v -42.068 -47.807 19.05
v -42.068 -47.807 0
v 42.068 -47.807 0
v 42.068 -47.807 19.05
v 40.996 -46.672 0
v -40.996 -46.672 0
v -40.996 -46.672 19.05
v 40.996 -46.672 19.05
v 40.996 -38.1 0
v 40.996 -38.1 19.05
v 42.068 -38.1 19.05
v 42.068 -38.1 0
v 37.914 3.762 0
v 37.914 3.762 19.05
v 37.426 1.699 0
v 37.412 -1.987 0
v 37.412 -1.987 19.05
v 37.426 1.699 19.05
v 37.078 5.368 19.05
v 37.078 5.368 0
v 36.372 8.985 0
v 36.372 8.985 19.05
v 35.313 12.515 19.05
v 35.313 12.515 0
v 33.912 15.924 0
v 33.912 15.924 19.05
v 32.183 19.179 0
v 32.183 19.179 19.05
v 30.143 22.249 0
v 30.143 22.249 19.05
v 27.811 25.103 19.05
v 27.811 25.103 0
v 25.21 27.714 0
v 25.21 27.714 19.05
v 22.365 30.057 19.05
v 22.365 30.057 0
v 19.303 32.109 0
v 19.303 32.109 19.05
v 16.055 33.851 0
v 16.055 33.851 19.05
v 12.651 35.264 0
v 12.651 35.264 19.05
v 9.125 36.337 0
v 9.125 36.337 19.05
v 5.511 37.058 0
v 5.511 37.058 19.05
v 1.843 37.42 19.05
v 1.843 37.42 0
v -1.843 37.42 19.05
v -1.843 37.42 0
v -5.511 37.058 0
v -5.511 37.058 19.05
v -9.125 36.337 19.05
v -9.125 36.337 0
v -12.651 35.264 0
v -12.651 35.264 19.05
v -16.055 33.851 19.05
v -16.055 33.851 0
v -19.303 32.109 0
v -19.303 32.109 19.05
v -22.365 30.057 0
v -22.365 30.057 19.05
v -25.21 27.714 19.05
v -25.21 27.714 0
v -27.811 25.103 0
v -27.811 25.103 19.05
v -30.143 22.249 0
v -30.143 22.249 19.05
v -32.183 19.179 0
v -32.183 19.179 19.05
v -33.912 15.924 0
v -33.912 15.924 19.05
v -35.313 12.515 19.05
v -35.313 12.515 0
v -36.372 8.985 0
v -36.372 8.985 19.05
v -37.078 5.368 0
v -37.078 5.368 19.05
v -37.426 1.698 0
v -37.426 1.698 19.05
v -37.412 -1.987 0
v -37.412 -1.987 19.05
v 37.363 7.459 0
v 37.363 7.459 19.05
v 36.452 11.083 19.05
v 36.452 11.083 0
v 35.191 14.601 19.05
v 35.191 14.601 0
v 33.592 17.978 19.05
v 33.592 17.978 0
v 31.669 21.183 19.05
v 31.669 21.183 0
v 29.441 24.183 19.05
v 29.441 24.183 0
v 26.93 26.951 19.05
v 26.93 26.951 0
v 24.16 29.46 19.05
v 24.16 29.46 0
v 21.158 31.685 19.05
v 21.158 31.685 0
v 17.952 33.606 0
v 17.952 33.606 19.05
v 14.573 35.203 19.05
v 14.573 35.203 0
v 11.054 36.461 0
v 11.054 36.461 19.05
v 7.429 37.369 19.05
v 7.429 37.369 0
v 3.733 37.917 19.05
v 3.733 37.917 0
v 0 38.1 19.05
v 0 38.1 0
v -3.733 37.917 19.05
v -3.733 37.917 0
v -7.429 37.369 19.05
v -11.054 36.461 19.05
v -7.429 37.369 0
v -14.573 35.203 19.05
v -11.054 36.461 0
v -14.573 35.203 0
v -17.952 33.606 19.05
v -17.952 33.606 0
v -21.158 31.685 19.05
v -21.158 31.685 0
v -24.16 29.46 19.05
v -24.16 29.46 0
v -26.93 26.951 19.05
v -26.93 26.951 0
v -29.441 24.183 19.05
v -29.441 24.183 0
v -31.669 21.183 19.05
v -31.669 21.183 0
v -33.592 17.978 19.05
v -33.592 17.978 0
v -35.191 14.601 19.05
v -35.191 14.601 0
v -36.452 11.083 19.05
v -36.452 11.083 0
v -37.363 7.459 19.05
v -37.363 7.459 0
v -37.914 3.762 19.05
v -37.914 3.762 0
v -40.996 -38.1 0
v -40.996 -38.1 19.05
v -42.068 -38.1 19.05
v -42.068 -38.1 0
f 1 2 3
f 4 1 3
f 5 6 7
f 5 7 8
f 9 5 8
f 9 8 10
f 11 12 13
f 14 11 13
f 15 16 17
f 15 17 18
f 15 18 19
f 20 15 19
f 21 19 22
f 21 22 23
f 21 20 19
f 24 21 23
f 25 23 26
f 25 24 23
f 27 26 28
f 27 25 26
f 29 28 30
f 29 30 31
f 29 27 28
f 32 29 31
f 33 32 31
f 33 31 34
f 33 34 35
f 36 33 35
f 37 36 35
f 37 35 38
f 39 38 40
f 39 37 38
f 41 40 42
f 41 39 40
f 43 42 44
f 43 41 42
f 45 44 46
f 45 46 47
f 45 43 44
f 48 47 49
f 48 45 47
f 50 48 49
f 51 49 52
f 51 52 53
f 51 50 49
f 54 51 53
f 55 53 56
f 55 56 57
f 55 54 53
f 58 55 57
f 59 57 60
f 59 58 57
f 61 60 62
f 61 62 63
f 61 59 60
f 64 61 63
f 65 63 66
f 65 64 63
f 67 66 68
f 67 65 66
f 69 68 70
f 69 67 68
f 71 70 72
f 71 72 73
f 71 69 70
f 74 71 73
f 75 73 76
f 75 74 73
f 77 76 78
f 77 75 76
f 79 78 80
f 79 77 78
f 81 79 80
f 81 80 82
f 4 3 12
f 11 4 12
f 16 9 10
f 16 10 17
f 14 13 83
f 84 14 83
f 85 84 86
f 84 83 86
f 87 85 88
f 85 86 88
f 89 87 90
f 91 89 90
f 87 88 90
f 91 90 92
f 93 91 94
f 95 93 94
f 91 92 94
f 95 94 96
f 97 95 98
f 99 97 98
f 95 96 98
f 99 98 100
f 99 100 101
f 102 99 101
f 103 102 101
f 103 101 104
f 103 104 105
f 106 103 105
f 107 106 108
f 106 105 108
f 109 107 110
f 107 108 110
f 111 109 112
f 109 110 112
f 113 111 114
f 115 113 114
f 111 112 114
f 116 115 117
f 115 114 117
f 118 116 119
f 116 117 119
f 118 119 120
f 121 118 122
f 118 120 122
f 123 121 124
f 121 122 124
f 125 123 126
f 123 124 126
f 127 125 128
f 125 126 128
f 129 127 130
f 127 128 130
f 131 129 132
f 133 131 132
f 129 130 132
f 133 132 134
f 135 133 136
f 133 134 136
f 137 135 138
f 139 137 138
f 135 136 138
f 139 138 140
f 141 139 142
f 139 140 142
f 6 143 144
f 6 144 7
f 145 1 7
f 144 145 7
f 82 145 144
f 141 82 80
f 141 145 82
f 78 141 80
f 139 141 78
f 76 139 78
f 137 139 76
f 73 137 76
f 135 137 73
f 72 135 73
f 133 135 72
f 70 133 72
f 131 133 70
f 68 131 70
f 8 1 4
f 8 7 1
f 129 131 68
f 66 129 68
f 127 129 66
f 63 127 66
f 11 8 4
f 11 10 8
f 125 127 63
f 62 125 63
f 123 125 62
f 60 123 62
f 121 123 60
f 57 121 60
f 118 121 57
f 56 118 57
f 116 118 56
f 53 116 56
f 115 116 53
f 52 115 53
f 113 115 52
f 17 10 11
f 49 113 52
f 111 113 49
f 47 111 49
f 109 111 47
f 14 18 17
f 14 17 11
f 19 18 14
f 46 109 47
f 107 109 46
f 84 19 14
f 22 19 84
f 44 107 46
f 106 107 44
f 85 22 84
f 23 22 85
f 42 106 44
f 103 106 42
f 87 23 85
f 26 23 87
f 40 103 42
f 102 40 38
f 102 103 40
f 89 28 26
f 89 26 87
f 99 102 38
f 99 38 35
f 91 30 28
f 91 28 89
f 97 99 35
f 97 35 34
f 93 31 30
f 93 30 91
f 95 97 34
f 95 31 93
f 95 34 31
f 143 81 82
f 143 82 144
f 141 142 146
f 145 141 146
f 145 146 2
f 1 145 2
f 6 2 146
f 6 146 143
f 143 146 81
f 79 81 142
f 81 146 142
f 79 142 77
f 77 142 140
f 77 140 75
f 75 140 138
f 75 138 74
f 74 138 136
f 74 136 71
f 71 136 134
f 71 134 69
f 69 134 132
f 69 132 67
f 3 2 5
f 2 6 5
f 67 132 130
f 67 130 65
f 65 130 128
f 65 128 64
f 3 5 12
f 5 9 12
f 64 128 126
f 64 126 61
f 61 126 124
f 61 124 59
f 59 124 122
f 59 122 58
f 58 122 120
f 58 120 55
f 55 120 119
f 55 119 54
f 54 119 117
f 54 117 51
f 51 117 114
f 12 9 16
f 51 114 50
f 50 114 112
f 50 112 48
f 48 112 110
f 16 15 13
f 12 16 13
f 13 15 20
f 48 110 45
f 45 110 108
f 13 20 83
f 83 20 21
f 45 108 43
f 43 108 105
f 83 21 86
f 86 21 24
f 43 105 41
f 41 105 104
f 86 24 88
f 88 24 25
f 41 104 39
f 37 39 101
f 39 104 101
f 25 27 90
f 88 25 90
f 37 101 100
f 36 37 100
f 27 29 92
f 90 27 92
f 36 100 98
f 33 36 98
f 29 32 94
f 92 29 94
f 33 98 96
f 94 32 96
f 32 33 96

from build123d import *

# Parameters (mm, degrees)
BOSS_EXTRUDE1_DEPTH = 19.05


with BuildPart() as part:
    # Sketch1 → Boss-Extrude1 (new body)
    with BuildSketch(Plane.XY):
        with BuildLine():
            Line((-37.913782616, 3.762324776), (-42.067935824, -38.1))
            Line((-42.067935824, -38.1), (-42.067935824, -47.807493339))
            Line((-42.067935824, -47.807493339), (42.067935824, -47.807493339))
            Line((42.067935824, -47.807493339), (42.067935824, -38.1))
            Line((42.067935824, -38.1), (37.913782616, 3.762324776))
            ThreePointArc((37.913782616, 3.762324776), (0, 38.1), (-37.913782616, 3.762324776))
        make_face()
        with BuildLine():
            Line((-37.412264152, -1.987137644), (-40.995876955, -38.1))
            Line((-40.995876955, -38.1), (-40.995876955, -46.6725))
            Line((-40.995876955, -46.6725), (40.995876955, -46.6725))
            Line((40.995876955, -46.6725), (40.995876955, -38.099992109))
            Line((40.995876955, -38.099992109), (37.412264425, -1.987132504))
            ThreePointArc((37.412264425, -1.987132504), (-2.574e-06, 37.465), (-37.412264152, -1.987137644))
        make_face(mode=Mode.SUBTRACT)
    extrude(amount=BOSS_EXTRUDE1_DEPTH)


solid = part.part
